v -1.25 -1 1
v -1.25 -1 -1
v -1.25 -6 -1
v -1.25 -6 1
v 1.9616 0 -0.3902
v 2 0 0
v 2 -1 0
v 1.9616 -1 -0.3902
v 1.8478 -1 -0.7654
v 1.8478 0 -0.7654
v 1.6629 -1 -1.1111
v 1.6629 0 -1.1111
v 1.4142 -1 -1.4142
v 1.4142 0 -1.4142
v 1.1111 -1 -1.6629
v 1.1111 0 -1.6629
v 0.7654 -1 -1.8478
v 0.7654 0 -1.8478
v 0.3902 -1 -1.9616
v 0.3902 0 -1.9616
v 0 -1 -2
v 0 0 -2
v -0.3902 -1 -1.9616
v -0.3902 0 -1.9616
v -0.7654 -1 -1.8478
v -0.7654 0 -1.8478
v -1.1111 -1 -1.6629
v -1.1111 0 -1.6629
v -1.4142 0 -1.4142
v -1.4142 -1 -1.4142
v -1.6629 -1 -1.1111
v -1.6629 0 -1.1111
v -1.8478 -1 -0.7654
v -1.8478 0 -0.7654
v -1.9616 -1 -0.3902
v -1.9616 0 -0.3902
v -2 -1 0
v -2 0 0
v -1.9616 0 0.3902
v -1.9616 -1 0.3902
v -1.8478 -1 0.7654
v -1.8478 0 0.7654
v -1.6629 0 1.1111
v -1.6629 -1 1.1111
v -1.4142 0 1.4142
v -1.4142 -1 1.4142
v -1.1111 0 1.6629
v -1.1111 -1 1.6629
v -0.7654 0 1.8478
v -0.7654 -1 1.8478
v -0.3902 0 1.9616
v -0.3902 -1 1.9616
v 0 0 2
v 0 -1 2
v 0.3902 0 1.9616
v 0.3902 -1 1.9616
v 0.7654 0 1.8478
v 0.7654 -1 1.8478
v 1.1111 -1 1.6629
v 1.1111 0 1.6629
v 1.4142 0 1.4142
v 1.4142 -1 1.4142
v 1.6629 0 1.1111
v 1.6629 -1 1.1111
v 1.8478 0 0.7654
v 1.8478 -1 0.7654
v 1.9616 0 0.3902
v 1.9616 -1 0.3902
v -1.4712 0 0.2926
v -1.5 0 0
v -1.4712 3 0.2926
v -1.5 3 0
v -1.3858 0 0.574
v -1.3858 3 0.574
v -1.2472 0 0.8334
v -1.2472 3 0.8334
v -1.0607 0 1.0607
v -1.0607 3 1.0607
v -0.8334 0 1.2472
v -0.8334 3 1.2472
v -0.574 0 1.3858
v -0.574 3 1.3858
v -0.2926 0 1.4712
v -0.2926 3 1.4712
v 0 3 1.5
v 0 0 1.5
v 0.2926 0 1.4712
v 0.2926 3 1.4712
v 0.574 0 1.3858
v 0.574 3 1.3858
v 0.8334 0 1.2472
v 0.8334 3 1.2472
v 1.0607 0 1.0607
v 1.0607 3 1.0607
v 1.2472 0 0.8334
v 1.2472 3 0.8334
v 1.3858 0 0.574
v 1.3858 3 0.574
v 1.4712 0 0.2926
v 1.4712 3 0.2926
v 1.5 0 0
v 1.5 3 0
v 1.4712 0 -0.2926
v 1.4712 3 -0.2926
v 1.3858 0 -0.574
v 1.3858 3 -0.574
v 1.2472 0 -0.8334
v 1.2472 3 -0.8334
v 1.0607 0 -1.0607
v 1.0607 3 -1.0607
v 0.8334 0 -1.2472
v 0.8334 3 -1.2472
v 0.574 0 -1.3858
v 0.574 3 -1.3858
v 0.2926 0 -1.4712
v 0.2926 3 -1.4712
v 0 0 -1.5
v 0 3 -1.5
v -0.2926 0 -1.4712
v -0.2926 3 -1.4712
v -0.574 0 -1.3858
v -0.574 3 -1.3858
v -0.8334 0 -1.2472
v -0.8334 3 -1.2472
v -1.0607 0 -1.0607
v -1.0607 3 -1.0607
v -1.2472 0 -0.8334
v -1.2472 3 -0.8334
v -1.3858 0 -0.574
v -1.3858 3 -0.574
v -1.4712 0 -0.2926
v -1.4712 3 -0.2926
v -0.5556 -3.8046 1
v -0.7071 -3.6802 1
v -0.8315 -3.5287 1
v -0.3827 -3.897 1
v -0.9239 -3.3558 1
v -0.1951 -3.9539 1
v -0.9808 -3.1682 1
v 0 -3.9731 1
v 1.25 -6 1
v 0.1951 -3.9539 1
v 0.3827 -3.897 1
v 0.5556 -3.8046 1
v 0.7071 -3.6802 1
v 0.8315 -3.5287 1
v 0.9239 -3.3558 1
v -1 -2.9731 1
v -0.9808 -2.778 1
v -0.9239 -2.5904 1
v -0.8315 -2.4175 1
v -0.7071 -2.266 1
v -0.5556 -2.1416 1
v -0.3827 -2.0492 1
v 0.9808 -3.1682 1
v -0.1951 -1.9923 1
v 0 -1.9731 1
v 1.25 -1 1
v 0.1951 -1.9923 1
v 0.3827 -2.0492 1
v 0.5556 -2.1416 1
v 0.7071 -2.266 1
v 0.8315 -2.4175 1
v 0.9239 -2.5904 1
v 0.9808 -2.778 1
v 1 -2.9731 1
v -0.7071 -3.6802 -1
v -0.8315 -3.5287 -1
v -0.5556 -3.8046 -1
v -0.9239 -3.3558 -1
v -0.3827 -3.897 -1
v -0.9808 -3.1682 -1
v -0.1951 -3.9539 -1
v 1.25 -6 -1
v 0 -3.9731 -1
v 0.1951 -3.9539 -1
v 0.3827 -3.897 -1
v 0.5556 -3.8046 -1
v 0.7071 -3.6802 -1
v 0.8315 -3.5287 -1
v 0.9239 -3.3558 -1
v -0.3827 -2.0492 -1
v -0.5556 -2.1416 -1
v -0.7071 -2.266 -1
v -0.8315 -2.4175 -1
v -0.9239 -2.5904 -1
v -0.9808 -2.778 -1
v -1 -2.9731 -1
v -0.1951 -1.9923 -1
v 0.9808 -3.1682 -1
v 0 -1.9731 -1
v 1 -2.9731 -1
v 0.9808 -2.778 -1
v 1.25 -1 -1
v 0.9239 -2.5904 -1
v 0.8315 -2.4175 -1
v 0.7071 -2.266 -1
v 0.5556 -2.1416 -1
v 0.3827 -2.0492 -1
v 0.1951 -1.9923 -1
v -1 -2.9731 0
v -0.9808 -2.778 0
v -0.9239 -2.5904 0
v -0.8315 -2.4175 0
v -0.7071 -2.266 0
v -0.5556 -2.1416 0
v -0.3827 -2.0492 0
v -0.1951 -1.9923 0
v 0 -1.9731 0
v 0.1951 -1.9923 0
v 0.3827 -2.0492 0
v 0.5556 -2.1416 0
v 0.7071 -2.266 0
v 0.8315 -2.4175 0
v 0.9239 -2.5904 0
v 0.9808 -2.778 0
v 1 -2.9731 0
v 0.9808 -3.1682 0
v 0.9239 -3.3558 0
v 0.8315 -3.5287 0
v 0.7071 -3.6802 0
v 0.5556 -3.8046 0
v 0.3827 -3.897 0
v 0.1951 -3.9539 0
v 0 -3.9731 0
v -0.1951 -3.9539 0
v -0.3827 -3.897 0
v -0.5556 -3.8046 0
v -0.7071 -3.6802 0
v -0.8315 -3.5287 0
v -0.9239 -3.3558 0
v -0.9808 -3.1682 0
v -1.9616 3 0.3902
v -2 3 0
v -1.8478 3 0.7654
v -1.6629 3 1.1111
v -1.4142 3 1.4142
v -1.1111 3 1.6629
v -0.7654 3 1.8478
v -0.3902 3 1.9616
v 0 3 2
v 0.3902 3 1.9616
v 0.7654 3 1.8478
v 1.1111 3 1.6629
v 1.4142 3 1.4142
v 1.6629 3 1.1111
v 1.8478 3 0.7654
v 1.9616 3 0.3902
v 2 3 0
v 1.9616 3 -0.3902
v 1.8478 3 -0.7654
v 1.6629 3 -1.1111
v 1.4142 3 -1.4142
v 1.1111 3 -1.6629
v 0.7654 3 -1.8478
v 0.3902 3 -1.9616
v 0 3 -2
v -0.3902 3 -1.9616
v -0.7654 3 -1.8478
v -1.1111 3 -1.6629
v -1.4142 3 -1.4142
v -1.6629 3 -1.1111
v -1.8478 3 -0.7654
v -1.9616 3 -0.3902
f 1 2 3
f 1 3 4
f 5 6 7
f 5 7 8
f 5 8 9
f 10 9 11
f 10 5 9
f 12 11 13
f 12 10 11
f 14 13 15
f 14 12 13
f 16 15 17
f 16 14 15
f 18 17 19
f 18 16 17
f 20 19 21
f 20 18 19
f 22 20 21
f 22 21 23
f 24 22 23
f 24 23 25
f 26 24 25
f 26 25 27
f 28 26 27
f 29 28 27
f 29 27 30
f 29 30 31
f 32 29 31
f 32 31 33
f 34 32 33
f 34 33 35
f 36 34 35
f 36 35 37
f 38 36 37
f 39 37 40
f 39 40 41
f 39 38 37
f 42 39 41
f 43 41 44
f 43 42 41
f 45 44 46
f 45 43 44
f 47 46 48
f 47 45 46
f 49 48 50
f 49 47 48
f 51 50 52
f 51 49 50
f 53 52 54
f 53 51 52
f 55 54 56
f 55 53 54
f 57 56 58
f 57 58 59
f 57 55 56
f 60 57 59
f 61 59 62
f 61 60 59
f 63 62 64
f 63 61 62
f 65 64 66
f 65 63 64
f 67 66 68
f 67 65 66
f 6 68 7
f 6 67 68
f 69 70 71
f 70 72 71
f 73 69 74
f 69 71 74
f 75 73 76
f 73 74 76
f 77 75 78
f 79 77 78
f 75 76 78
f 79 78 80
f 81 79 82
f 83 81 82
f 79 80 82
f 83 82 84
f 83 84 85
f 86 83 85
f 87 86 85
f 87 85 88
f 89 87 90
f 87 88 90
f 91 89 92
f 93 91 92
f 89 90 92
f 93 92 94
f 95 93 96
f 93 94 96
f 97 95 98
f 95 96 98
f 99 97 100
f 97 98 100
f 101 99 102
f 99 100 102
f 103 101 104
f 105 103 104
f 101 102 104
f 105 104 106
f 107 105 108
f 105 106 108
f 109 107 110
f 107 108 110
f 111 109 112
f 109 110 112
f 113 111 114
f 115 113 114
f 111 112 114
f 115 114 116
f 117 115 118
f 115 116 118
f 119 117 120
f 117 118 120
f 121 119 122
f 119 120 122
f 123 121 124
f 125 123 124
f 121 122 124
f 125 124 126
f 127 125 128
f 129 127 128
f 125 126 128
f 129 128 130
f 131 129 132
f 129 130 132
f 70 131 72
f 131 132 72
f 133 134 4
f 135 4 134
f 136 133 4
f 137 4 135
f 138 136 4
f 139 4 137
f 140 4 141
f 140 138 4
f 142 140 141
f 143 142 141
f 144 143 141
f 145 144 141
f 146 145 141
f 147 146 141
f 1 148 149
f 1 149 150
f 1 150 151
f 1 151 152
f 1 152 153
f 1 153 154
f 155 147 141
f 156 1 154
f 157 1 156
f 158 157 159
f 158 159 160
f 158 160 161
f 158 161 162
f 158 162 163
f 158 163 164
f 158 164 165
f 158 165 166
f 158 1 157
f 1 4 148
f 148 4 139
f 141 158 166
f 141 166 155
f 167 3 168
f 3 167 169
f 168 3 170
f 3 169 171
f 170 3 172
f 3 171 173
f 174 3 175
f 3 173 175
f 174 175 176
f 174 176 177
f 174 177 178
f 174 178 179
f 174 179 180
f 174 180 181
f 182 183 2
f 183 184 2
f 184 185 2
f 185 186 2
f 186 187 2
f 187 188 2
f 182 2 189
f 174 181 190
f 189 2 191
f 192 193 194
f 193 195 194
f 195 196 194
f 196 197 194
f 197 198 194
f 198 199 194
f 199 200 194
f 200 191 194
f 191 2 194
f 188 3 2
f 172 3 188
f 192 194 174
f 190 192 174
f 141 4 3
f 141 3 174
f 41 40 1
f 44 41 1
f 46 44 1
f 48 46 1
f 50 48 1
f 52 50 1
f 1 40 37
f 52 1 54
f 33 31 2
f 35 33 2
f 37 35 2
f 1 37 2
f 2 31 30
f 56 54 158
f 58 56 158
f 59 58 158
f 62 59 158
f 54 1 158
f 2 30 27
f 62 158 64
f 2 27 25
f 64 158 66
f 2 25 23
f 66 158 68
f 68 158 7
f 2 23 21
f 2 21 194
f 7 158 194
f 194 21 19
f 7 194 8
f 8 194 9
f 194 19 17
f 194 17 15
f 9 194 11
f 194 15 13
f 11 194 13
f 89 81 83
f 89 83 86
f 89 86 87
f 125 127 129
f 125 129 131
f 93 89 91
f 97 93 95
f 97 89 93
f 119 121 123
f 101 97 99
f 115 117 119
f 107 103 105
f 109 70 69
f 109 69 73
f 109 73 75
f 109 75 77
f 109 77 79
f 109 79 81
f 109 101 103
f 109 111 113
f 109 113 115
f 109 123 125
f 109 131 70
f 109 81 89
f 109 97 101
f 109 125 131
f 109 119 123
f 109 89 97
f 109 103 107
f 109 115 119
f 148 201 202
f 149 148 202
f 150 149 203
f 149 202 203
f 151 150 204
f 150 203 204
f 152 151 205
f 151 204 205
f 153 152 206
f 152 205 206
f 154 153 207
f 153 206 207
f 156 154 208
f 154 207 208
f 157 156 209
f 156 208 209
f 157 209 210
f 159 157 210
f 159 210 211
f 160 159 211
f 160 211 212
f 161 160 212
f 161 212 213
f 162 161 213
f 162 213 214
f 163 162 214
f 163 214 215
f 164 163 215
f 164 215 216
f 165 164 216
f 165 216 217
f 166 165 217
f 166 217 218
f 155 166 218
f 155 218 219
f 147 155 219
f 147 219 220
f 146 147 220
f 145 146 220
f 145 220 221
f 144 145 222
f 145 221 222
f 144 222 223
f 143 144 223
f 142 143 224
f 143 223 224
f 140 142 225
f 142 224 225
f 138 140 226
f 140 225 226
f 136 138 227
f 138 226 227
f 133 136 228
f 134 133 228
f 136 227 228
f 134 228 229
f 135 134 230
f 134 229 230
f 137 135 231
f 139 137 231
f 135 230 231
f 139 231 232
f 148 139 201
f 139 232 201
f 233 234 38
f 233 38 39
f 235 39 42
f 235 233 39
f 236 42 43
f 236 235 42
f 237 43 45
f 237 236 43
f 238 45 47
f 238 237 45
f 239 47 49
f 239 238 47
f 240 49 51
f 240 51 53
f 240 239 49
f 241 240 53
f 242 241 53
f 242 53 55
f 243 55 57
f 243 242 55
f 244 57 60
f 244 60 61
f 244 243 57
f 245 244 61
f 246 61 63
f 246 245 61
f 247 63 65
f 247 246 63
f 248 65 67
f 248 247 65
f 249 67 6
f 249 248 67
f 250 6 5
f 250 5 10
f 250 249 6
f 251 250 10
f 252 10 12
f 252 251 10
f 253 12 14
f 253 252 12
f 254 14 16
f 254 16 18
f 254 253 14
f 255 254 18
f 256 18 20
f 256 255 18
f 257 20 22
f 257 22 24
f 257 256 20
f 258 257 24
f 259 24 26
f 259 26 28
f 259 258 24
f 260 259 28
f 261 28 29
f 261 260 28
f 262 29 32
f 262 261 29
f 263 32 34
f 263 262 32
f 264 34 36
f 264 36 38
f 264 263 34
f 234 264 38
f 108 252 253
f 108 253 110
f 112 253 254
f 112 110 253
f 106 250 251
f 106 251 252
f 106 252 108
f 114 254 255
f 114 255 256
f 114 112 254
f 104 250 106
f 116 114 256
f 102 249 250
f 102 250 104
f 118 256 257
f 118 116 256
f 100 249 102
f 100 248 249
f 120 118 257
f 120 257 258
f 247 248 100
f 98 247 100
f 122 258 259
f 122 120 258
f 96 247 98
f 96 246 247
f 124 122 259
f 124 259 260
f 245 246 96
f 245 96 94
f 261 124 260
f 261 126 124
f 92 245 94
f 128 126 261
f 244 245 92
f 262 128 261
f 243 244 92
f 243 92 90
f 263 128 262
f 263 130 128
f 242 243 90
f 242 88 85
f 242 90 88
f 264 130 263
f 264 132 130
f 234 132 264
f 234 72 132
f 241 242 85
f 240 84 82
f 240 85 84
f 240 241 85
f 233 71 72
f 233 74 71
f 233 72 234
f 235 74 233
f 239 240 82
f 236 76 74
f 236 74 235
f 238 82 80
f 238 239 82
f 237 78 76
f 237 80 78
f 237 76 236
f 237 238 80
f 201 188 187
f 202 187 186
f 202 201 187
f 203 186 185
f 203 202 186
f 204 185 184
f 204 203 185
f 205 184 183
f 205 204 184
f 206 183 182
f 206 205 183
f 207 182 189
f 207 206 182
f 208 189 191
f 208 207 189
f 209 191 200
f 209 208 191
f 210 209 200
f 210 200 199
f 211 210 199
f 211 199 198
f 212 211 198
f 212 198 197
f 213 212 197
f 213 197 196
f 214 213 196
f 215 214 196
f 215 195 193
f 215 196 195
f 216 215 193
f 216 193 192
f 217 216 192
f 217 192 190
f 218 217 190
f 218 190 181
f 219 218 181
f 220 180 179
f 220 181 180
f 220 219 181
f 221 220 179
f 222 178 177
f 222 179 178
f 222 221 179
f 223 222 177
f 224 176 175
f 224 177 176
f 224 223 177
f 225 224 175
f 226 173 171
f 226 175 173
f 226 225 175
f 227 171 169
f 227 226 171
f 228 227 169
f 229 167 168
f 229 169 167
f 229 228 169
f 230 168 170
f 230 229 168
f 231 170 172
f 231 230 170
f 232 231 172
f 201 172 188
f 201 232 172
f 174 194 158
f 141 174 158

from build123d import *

# Parameters (mm, degrees)
SKETCH1_W               = 0.5
SKETCH1_H               = 3
SKETCH2_R               = 2
BOSS_EXTRUDE1_DEPTH     = 1
SKETCH3_W               = 2.5
SKETCH3_H               = 2
BOSS_EXTRUDE2_DEPTH     = 5
SKETCH4_R               = 1
CUT_EXTRUDE1_DEPTH      = 3
CUT_EXTRUDE1_DEPTH_BACK = 3


with BuildPart() as part:
    # Sketch1 → Revolve1 (revolve)
    with BuildSketch(Plane.XY):
        with Locations((-1.75, 1.5)):
            Rectangle(SKETCH1_W, SKETCH1_H)
    revolve(axis=Axis((0, 0, 0), (0, 1, 0)))

    # Sketch2 → Boss-Extrude1 (add)
    with BuildSketch(Plane(origin=(0, 0, 0), x_dir=(1, 0, 0), z_dir=(0, 1, 0))):
        Circle(SKETCH2_R)
    extrude(amount=-BOSS_EXTRUDE1_DEPTH)

    # Sketch3 → Boss-Extrude2 (add)
    with BuildSketch(Plane.XZ.offset(1)):
        Rectangle(SKETCH3_W, SKETCH3_H)
    extrude(amount=BOSS_EXTRUDE2_DEPTH)

    # Sketch4 → Cut-Extrude1 (cut, two sides)
    with BuildSketch(Plane(origin=(0, 0, 0), x_dir=(-1, 0, 0), z_dir=(0, 0, -1))) as cut_extrude1_sk:
        with Locations((0, -2.973084611)):
            Circle(SKETCH4_R)
    extrude(amount=CUT_EXTRUDE1_DEPTH, mode=Mode.SUBTRACT)
    extrude(cut_extrude1_sk.sketch, amount=-CUT_EXTRUDE1_DEPTH_BACK, mode=Mode.SUBTRACT)


solid = part.part
